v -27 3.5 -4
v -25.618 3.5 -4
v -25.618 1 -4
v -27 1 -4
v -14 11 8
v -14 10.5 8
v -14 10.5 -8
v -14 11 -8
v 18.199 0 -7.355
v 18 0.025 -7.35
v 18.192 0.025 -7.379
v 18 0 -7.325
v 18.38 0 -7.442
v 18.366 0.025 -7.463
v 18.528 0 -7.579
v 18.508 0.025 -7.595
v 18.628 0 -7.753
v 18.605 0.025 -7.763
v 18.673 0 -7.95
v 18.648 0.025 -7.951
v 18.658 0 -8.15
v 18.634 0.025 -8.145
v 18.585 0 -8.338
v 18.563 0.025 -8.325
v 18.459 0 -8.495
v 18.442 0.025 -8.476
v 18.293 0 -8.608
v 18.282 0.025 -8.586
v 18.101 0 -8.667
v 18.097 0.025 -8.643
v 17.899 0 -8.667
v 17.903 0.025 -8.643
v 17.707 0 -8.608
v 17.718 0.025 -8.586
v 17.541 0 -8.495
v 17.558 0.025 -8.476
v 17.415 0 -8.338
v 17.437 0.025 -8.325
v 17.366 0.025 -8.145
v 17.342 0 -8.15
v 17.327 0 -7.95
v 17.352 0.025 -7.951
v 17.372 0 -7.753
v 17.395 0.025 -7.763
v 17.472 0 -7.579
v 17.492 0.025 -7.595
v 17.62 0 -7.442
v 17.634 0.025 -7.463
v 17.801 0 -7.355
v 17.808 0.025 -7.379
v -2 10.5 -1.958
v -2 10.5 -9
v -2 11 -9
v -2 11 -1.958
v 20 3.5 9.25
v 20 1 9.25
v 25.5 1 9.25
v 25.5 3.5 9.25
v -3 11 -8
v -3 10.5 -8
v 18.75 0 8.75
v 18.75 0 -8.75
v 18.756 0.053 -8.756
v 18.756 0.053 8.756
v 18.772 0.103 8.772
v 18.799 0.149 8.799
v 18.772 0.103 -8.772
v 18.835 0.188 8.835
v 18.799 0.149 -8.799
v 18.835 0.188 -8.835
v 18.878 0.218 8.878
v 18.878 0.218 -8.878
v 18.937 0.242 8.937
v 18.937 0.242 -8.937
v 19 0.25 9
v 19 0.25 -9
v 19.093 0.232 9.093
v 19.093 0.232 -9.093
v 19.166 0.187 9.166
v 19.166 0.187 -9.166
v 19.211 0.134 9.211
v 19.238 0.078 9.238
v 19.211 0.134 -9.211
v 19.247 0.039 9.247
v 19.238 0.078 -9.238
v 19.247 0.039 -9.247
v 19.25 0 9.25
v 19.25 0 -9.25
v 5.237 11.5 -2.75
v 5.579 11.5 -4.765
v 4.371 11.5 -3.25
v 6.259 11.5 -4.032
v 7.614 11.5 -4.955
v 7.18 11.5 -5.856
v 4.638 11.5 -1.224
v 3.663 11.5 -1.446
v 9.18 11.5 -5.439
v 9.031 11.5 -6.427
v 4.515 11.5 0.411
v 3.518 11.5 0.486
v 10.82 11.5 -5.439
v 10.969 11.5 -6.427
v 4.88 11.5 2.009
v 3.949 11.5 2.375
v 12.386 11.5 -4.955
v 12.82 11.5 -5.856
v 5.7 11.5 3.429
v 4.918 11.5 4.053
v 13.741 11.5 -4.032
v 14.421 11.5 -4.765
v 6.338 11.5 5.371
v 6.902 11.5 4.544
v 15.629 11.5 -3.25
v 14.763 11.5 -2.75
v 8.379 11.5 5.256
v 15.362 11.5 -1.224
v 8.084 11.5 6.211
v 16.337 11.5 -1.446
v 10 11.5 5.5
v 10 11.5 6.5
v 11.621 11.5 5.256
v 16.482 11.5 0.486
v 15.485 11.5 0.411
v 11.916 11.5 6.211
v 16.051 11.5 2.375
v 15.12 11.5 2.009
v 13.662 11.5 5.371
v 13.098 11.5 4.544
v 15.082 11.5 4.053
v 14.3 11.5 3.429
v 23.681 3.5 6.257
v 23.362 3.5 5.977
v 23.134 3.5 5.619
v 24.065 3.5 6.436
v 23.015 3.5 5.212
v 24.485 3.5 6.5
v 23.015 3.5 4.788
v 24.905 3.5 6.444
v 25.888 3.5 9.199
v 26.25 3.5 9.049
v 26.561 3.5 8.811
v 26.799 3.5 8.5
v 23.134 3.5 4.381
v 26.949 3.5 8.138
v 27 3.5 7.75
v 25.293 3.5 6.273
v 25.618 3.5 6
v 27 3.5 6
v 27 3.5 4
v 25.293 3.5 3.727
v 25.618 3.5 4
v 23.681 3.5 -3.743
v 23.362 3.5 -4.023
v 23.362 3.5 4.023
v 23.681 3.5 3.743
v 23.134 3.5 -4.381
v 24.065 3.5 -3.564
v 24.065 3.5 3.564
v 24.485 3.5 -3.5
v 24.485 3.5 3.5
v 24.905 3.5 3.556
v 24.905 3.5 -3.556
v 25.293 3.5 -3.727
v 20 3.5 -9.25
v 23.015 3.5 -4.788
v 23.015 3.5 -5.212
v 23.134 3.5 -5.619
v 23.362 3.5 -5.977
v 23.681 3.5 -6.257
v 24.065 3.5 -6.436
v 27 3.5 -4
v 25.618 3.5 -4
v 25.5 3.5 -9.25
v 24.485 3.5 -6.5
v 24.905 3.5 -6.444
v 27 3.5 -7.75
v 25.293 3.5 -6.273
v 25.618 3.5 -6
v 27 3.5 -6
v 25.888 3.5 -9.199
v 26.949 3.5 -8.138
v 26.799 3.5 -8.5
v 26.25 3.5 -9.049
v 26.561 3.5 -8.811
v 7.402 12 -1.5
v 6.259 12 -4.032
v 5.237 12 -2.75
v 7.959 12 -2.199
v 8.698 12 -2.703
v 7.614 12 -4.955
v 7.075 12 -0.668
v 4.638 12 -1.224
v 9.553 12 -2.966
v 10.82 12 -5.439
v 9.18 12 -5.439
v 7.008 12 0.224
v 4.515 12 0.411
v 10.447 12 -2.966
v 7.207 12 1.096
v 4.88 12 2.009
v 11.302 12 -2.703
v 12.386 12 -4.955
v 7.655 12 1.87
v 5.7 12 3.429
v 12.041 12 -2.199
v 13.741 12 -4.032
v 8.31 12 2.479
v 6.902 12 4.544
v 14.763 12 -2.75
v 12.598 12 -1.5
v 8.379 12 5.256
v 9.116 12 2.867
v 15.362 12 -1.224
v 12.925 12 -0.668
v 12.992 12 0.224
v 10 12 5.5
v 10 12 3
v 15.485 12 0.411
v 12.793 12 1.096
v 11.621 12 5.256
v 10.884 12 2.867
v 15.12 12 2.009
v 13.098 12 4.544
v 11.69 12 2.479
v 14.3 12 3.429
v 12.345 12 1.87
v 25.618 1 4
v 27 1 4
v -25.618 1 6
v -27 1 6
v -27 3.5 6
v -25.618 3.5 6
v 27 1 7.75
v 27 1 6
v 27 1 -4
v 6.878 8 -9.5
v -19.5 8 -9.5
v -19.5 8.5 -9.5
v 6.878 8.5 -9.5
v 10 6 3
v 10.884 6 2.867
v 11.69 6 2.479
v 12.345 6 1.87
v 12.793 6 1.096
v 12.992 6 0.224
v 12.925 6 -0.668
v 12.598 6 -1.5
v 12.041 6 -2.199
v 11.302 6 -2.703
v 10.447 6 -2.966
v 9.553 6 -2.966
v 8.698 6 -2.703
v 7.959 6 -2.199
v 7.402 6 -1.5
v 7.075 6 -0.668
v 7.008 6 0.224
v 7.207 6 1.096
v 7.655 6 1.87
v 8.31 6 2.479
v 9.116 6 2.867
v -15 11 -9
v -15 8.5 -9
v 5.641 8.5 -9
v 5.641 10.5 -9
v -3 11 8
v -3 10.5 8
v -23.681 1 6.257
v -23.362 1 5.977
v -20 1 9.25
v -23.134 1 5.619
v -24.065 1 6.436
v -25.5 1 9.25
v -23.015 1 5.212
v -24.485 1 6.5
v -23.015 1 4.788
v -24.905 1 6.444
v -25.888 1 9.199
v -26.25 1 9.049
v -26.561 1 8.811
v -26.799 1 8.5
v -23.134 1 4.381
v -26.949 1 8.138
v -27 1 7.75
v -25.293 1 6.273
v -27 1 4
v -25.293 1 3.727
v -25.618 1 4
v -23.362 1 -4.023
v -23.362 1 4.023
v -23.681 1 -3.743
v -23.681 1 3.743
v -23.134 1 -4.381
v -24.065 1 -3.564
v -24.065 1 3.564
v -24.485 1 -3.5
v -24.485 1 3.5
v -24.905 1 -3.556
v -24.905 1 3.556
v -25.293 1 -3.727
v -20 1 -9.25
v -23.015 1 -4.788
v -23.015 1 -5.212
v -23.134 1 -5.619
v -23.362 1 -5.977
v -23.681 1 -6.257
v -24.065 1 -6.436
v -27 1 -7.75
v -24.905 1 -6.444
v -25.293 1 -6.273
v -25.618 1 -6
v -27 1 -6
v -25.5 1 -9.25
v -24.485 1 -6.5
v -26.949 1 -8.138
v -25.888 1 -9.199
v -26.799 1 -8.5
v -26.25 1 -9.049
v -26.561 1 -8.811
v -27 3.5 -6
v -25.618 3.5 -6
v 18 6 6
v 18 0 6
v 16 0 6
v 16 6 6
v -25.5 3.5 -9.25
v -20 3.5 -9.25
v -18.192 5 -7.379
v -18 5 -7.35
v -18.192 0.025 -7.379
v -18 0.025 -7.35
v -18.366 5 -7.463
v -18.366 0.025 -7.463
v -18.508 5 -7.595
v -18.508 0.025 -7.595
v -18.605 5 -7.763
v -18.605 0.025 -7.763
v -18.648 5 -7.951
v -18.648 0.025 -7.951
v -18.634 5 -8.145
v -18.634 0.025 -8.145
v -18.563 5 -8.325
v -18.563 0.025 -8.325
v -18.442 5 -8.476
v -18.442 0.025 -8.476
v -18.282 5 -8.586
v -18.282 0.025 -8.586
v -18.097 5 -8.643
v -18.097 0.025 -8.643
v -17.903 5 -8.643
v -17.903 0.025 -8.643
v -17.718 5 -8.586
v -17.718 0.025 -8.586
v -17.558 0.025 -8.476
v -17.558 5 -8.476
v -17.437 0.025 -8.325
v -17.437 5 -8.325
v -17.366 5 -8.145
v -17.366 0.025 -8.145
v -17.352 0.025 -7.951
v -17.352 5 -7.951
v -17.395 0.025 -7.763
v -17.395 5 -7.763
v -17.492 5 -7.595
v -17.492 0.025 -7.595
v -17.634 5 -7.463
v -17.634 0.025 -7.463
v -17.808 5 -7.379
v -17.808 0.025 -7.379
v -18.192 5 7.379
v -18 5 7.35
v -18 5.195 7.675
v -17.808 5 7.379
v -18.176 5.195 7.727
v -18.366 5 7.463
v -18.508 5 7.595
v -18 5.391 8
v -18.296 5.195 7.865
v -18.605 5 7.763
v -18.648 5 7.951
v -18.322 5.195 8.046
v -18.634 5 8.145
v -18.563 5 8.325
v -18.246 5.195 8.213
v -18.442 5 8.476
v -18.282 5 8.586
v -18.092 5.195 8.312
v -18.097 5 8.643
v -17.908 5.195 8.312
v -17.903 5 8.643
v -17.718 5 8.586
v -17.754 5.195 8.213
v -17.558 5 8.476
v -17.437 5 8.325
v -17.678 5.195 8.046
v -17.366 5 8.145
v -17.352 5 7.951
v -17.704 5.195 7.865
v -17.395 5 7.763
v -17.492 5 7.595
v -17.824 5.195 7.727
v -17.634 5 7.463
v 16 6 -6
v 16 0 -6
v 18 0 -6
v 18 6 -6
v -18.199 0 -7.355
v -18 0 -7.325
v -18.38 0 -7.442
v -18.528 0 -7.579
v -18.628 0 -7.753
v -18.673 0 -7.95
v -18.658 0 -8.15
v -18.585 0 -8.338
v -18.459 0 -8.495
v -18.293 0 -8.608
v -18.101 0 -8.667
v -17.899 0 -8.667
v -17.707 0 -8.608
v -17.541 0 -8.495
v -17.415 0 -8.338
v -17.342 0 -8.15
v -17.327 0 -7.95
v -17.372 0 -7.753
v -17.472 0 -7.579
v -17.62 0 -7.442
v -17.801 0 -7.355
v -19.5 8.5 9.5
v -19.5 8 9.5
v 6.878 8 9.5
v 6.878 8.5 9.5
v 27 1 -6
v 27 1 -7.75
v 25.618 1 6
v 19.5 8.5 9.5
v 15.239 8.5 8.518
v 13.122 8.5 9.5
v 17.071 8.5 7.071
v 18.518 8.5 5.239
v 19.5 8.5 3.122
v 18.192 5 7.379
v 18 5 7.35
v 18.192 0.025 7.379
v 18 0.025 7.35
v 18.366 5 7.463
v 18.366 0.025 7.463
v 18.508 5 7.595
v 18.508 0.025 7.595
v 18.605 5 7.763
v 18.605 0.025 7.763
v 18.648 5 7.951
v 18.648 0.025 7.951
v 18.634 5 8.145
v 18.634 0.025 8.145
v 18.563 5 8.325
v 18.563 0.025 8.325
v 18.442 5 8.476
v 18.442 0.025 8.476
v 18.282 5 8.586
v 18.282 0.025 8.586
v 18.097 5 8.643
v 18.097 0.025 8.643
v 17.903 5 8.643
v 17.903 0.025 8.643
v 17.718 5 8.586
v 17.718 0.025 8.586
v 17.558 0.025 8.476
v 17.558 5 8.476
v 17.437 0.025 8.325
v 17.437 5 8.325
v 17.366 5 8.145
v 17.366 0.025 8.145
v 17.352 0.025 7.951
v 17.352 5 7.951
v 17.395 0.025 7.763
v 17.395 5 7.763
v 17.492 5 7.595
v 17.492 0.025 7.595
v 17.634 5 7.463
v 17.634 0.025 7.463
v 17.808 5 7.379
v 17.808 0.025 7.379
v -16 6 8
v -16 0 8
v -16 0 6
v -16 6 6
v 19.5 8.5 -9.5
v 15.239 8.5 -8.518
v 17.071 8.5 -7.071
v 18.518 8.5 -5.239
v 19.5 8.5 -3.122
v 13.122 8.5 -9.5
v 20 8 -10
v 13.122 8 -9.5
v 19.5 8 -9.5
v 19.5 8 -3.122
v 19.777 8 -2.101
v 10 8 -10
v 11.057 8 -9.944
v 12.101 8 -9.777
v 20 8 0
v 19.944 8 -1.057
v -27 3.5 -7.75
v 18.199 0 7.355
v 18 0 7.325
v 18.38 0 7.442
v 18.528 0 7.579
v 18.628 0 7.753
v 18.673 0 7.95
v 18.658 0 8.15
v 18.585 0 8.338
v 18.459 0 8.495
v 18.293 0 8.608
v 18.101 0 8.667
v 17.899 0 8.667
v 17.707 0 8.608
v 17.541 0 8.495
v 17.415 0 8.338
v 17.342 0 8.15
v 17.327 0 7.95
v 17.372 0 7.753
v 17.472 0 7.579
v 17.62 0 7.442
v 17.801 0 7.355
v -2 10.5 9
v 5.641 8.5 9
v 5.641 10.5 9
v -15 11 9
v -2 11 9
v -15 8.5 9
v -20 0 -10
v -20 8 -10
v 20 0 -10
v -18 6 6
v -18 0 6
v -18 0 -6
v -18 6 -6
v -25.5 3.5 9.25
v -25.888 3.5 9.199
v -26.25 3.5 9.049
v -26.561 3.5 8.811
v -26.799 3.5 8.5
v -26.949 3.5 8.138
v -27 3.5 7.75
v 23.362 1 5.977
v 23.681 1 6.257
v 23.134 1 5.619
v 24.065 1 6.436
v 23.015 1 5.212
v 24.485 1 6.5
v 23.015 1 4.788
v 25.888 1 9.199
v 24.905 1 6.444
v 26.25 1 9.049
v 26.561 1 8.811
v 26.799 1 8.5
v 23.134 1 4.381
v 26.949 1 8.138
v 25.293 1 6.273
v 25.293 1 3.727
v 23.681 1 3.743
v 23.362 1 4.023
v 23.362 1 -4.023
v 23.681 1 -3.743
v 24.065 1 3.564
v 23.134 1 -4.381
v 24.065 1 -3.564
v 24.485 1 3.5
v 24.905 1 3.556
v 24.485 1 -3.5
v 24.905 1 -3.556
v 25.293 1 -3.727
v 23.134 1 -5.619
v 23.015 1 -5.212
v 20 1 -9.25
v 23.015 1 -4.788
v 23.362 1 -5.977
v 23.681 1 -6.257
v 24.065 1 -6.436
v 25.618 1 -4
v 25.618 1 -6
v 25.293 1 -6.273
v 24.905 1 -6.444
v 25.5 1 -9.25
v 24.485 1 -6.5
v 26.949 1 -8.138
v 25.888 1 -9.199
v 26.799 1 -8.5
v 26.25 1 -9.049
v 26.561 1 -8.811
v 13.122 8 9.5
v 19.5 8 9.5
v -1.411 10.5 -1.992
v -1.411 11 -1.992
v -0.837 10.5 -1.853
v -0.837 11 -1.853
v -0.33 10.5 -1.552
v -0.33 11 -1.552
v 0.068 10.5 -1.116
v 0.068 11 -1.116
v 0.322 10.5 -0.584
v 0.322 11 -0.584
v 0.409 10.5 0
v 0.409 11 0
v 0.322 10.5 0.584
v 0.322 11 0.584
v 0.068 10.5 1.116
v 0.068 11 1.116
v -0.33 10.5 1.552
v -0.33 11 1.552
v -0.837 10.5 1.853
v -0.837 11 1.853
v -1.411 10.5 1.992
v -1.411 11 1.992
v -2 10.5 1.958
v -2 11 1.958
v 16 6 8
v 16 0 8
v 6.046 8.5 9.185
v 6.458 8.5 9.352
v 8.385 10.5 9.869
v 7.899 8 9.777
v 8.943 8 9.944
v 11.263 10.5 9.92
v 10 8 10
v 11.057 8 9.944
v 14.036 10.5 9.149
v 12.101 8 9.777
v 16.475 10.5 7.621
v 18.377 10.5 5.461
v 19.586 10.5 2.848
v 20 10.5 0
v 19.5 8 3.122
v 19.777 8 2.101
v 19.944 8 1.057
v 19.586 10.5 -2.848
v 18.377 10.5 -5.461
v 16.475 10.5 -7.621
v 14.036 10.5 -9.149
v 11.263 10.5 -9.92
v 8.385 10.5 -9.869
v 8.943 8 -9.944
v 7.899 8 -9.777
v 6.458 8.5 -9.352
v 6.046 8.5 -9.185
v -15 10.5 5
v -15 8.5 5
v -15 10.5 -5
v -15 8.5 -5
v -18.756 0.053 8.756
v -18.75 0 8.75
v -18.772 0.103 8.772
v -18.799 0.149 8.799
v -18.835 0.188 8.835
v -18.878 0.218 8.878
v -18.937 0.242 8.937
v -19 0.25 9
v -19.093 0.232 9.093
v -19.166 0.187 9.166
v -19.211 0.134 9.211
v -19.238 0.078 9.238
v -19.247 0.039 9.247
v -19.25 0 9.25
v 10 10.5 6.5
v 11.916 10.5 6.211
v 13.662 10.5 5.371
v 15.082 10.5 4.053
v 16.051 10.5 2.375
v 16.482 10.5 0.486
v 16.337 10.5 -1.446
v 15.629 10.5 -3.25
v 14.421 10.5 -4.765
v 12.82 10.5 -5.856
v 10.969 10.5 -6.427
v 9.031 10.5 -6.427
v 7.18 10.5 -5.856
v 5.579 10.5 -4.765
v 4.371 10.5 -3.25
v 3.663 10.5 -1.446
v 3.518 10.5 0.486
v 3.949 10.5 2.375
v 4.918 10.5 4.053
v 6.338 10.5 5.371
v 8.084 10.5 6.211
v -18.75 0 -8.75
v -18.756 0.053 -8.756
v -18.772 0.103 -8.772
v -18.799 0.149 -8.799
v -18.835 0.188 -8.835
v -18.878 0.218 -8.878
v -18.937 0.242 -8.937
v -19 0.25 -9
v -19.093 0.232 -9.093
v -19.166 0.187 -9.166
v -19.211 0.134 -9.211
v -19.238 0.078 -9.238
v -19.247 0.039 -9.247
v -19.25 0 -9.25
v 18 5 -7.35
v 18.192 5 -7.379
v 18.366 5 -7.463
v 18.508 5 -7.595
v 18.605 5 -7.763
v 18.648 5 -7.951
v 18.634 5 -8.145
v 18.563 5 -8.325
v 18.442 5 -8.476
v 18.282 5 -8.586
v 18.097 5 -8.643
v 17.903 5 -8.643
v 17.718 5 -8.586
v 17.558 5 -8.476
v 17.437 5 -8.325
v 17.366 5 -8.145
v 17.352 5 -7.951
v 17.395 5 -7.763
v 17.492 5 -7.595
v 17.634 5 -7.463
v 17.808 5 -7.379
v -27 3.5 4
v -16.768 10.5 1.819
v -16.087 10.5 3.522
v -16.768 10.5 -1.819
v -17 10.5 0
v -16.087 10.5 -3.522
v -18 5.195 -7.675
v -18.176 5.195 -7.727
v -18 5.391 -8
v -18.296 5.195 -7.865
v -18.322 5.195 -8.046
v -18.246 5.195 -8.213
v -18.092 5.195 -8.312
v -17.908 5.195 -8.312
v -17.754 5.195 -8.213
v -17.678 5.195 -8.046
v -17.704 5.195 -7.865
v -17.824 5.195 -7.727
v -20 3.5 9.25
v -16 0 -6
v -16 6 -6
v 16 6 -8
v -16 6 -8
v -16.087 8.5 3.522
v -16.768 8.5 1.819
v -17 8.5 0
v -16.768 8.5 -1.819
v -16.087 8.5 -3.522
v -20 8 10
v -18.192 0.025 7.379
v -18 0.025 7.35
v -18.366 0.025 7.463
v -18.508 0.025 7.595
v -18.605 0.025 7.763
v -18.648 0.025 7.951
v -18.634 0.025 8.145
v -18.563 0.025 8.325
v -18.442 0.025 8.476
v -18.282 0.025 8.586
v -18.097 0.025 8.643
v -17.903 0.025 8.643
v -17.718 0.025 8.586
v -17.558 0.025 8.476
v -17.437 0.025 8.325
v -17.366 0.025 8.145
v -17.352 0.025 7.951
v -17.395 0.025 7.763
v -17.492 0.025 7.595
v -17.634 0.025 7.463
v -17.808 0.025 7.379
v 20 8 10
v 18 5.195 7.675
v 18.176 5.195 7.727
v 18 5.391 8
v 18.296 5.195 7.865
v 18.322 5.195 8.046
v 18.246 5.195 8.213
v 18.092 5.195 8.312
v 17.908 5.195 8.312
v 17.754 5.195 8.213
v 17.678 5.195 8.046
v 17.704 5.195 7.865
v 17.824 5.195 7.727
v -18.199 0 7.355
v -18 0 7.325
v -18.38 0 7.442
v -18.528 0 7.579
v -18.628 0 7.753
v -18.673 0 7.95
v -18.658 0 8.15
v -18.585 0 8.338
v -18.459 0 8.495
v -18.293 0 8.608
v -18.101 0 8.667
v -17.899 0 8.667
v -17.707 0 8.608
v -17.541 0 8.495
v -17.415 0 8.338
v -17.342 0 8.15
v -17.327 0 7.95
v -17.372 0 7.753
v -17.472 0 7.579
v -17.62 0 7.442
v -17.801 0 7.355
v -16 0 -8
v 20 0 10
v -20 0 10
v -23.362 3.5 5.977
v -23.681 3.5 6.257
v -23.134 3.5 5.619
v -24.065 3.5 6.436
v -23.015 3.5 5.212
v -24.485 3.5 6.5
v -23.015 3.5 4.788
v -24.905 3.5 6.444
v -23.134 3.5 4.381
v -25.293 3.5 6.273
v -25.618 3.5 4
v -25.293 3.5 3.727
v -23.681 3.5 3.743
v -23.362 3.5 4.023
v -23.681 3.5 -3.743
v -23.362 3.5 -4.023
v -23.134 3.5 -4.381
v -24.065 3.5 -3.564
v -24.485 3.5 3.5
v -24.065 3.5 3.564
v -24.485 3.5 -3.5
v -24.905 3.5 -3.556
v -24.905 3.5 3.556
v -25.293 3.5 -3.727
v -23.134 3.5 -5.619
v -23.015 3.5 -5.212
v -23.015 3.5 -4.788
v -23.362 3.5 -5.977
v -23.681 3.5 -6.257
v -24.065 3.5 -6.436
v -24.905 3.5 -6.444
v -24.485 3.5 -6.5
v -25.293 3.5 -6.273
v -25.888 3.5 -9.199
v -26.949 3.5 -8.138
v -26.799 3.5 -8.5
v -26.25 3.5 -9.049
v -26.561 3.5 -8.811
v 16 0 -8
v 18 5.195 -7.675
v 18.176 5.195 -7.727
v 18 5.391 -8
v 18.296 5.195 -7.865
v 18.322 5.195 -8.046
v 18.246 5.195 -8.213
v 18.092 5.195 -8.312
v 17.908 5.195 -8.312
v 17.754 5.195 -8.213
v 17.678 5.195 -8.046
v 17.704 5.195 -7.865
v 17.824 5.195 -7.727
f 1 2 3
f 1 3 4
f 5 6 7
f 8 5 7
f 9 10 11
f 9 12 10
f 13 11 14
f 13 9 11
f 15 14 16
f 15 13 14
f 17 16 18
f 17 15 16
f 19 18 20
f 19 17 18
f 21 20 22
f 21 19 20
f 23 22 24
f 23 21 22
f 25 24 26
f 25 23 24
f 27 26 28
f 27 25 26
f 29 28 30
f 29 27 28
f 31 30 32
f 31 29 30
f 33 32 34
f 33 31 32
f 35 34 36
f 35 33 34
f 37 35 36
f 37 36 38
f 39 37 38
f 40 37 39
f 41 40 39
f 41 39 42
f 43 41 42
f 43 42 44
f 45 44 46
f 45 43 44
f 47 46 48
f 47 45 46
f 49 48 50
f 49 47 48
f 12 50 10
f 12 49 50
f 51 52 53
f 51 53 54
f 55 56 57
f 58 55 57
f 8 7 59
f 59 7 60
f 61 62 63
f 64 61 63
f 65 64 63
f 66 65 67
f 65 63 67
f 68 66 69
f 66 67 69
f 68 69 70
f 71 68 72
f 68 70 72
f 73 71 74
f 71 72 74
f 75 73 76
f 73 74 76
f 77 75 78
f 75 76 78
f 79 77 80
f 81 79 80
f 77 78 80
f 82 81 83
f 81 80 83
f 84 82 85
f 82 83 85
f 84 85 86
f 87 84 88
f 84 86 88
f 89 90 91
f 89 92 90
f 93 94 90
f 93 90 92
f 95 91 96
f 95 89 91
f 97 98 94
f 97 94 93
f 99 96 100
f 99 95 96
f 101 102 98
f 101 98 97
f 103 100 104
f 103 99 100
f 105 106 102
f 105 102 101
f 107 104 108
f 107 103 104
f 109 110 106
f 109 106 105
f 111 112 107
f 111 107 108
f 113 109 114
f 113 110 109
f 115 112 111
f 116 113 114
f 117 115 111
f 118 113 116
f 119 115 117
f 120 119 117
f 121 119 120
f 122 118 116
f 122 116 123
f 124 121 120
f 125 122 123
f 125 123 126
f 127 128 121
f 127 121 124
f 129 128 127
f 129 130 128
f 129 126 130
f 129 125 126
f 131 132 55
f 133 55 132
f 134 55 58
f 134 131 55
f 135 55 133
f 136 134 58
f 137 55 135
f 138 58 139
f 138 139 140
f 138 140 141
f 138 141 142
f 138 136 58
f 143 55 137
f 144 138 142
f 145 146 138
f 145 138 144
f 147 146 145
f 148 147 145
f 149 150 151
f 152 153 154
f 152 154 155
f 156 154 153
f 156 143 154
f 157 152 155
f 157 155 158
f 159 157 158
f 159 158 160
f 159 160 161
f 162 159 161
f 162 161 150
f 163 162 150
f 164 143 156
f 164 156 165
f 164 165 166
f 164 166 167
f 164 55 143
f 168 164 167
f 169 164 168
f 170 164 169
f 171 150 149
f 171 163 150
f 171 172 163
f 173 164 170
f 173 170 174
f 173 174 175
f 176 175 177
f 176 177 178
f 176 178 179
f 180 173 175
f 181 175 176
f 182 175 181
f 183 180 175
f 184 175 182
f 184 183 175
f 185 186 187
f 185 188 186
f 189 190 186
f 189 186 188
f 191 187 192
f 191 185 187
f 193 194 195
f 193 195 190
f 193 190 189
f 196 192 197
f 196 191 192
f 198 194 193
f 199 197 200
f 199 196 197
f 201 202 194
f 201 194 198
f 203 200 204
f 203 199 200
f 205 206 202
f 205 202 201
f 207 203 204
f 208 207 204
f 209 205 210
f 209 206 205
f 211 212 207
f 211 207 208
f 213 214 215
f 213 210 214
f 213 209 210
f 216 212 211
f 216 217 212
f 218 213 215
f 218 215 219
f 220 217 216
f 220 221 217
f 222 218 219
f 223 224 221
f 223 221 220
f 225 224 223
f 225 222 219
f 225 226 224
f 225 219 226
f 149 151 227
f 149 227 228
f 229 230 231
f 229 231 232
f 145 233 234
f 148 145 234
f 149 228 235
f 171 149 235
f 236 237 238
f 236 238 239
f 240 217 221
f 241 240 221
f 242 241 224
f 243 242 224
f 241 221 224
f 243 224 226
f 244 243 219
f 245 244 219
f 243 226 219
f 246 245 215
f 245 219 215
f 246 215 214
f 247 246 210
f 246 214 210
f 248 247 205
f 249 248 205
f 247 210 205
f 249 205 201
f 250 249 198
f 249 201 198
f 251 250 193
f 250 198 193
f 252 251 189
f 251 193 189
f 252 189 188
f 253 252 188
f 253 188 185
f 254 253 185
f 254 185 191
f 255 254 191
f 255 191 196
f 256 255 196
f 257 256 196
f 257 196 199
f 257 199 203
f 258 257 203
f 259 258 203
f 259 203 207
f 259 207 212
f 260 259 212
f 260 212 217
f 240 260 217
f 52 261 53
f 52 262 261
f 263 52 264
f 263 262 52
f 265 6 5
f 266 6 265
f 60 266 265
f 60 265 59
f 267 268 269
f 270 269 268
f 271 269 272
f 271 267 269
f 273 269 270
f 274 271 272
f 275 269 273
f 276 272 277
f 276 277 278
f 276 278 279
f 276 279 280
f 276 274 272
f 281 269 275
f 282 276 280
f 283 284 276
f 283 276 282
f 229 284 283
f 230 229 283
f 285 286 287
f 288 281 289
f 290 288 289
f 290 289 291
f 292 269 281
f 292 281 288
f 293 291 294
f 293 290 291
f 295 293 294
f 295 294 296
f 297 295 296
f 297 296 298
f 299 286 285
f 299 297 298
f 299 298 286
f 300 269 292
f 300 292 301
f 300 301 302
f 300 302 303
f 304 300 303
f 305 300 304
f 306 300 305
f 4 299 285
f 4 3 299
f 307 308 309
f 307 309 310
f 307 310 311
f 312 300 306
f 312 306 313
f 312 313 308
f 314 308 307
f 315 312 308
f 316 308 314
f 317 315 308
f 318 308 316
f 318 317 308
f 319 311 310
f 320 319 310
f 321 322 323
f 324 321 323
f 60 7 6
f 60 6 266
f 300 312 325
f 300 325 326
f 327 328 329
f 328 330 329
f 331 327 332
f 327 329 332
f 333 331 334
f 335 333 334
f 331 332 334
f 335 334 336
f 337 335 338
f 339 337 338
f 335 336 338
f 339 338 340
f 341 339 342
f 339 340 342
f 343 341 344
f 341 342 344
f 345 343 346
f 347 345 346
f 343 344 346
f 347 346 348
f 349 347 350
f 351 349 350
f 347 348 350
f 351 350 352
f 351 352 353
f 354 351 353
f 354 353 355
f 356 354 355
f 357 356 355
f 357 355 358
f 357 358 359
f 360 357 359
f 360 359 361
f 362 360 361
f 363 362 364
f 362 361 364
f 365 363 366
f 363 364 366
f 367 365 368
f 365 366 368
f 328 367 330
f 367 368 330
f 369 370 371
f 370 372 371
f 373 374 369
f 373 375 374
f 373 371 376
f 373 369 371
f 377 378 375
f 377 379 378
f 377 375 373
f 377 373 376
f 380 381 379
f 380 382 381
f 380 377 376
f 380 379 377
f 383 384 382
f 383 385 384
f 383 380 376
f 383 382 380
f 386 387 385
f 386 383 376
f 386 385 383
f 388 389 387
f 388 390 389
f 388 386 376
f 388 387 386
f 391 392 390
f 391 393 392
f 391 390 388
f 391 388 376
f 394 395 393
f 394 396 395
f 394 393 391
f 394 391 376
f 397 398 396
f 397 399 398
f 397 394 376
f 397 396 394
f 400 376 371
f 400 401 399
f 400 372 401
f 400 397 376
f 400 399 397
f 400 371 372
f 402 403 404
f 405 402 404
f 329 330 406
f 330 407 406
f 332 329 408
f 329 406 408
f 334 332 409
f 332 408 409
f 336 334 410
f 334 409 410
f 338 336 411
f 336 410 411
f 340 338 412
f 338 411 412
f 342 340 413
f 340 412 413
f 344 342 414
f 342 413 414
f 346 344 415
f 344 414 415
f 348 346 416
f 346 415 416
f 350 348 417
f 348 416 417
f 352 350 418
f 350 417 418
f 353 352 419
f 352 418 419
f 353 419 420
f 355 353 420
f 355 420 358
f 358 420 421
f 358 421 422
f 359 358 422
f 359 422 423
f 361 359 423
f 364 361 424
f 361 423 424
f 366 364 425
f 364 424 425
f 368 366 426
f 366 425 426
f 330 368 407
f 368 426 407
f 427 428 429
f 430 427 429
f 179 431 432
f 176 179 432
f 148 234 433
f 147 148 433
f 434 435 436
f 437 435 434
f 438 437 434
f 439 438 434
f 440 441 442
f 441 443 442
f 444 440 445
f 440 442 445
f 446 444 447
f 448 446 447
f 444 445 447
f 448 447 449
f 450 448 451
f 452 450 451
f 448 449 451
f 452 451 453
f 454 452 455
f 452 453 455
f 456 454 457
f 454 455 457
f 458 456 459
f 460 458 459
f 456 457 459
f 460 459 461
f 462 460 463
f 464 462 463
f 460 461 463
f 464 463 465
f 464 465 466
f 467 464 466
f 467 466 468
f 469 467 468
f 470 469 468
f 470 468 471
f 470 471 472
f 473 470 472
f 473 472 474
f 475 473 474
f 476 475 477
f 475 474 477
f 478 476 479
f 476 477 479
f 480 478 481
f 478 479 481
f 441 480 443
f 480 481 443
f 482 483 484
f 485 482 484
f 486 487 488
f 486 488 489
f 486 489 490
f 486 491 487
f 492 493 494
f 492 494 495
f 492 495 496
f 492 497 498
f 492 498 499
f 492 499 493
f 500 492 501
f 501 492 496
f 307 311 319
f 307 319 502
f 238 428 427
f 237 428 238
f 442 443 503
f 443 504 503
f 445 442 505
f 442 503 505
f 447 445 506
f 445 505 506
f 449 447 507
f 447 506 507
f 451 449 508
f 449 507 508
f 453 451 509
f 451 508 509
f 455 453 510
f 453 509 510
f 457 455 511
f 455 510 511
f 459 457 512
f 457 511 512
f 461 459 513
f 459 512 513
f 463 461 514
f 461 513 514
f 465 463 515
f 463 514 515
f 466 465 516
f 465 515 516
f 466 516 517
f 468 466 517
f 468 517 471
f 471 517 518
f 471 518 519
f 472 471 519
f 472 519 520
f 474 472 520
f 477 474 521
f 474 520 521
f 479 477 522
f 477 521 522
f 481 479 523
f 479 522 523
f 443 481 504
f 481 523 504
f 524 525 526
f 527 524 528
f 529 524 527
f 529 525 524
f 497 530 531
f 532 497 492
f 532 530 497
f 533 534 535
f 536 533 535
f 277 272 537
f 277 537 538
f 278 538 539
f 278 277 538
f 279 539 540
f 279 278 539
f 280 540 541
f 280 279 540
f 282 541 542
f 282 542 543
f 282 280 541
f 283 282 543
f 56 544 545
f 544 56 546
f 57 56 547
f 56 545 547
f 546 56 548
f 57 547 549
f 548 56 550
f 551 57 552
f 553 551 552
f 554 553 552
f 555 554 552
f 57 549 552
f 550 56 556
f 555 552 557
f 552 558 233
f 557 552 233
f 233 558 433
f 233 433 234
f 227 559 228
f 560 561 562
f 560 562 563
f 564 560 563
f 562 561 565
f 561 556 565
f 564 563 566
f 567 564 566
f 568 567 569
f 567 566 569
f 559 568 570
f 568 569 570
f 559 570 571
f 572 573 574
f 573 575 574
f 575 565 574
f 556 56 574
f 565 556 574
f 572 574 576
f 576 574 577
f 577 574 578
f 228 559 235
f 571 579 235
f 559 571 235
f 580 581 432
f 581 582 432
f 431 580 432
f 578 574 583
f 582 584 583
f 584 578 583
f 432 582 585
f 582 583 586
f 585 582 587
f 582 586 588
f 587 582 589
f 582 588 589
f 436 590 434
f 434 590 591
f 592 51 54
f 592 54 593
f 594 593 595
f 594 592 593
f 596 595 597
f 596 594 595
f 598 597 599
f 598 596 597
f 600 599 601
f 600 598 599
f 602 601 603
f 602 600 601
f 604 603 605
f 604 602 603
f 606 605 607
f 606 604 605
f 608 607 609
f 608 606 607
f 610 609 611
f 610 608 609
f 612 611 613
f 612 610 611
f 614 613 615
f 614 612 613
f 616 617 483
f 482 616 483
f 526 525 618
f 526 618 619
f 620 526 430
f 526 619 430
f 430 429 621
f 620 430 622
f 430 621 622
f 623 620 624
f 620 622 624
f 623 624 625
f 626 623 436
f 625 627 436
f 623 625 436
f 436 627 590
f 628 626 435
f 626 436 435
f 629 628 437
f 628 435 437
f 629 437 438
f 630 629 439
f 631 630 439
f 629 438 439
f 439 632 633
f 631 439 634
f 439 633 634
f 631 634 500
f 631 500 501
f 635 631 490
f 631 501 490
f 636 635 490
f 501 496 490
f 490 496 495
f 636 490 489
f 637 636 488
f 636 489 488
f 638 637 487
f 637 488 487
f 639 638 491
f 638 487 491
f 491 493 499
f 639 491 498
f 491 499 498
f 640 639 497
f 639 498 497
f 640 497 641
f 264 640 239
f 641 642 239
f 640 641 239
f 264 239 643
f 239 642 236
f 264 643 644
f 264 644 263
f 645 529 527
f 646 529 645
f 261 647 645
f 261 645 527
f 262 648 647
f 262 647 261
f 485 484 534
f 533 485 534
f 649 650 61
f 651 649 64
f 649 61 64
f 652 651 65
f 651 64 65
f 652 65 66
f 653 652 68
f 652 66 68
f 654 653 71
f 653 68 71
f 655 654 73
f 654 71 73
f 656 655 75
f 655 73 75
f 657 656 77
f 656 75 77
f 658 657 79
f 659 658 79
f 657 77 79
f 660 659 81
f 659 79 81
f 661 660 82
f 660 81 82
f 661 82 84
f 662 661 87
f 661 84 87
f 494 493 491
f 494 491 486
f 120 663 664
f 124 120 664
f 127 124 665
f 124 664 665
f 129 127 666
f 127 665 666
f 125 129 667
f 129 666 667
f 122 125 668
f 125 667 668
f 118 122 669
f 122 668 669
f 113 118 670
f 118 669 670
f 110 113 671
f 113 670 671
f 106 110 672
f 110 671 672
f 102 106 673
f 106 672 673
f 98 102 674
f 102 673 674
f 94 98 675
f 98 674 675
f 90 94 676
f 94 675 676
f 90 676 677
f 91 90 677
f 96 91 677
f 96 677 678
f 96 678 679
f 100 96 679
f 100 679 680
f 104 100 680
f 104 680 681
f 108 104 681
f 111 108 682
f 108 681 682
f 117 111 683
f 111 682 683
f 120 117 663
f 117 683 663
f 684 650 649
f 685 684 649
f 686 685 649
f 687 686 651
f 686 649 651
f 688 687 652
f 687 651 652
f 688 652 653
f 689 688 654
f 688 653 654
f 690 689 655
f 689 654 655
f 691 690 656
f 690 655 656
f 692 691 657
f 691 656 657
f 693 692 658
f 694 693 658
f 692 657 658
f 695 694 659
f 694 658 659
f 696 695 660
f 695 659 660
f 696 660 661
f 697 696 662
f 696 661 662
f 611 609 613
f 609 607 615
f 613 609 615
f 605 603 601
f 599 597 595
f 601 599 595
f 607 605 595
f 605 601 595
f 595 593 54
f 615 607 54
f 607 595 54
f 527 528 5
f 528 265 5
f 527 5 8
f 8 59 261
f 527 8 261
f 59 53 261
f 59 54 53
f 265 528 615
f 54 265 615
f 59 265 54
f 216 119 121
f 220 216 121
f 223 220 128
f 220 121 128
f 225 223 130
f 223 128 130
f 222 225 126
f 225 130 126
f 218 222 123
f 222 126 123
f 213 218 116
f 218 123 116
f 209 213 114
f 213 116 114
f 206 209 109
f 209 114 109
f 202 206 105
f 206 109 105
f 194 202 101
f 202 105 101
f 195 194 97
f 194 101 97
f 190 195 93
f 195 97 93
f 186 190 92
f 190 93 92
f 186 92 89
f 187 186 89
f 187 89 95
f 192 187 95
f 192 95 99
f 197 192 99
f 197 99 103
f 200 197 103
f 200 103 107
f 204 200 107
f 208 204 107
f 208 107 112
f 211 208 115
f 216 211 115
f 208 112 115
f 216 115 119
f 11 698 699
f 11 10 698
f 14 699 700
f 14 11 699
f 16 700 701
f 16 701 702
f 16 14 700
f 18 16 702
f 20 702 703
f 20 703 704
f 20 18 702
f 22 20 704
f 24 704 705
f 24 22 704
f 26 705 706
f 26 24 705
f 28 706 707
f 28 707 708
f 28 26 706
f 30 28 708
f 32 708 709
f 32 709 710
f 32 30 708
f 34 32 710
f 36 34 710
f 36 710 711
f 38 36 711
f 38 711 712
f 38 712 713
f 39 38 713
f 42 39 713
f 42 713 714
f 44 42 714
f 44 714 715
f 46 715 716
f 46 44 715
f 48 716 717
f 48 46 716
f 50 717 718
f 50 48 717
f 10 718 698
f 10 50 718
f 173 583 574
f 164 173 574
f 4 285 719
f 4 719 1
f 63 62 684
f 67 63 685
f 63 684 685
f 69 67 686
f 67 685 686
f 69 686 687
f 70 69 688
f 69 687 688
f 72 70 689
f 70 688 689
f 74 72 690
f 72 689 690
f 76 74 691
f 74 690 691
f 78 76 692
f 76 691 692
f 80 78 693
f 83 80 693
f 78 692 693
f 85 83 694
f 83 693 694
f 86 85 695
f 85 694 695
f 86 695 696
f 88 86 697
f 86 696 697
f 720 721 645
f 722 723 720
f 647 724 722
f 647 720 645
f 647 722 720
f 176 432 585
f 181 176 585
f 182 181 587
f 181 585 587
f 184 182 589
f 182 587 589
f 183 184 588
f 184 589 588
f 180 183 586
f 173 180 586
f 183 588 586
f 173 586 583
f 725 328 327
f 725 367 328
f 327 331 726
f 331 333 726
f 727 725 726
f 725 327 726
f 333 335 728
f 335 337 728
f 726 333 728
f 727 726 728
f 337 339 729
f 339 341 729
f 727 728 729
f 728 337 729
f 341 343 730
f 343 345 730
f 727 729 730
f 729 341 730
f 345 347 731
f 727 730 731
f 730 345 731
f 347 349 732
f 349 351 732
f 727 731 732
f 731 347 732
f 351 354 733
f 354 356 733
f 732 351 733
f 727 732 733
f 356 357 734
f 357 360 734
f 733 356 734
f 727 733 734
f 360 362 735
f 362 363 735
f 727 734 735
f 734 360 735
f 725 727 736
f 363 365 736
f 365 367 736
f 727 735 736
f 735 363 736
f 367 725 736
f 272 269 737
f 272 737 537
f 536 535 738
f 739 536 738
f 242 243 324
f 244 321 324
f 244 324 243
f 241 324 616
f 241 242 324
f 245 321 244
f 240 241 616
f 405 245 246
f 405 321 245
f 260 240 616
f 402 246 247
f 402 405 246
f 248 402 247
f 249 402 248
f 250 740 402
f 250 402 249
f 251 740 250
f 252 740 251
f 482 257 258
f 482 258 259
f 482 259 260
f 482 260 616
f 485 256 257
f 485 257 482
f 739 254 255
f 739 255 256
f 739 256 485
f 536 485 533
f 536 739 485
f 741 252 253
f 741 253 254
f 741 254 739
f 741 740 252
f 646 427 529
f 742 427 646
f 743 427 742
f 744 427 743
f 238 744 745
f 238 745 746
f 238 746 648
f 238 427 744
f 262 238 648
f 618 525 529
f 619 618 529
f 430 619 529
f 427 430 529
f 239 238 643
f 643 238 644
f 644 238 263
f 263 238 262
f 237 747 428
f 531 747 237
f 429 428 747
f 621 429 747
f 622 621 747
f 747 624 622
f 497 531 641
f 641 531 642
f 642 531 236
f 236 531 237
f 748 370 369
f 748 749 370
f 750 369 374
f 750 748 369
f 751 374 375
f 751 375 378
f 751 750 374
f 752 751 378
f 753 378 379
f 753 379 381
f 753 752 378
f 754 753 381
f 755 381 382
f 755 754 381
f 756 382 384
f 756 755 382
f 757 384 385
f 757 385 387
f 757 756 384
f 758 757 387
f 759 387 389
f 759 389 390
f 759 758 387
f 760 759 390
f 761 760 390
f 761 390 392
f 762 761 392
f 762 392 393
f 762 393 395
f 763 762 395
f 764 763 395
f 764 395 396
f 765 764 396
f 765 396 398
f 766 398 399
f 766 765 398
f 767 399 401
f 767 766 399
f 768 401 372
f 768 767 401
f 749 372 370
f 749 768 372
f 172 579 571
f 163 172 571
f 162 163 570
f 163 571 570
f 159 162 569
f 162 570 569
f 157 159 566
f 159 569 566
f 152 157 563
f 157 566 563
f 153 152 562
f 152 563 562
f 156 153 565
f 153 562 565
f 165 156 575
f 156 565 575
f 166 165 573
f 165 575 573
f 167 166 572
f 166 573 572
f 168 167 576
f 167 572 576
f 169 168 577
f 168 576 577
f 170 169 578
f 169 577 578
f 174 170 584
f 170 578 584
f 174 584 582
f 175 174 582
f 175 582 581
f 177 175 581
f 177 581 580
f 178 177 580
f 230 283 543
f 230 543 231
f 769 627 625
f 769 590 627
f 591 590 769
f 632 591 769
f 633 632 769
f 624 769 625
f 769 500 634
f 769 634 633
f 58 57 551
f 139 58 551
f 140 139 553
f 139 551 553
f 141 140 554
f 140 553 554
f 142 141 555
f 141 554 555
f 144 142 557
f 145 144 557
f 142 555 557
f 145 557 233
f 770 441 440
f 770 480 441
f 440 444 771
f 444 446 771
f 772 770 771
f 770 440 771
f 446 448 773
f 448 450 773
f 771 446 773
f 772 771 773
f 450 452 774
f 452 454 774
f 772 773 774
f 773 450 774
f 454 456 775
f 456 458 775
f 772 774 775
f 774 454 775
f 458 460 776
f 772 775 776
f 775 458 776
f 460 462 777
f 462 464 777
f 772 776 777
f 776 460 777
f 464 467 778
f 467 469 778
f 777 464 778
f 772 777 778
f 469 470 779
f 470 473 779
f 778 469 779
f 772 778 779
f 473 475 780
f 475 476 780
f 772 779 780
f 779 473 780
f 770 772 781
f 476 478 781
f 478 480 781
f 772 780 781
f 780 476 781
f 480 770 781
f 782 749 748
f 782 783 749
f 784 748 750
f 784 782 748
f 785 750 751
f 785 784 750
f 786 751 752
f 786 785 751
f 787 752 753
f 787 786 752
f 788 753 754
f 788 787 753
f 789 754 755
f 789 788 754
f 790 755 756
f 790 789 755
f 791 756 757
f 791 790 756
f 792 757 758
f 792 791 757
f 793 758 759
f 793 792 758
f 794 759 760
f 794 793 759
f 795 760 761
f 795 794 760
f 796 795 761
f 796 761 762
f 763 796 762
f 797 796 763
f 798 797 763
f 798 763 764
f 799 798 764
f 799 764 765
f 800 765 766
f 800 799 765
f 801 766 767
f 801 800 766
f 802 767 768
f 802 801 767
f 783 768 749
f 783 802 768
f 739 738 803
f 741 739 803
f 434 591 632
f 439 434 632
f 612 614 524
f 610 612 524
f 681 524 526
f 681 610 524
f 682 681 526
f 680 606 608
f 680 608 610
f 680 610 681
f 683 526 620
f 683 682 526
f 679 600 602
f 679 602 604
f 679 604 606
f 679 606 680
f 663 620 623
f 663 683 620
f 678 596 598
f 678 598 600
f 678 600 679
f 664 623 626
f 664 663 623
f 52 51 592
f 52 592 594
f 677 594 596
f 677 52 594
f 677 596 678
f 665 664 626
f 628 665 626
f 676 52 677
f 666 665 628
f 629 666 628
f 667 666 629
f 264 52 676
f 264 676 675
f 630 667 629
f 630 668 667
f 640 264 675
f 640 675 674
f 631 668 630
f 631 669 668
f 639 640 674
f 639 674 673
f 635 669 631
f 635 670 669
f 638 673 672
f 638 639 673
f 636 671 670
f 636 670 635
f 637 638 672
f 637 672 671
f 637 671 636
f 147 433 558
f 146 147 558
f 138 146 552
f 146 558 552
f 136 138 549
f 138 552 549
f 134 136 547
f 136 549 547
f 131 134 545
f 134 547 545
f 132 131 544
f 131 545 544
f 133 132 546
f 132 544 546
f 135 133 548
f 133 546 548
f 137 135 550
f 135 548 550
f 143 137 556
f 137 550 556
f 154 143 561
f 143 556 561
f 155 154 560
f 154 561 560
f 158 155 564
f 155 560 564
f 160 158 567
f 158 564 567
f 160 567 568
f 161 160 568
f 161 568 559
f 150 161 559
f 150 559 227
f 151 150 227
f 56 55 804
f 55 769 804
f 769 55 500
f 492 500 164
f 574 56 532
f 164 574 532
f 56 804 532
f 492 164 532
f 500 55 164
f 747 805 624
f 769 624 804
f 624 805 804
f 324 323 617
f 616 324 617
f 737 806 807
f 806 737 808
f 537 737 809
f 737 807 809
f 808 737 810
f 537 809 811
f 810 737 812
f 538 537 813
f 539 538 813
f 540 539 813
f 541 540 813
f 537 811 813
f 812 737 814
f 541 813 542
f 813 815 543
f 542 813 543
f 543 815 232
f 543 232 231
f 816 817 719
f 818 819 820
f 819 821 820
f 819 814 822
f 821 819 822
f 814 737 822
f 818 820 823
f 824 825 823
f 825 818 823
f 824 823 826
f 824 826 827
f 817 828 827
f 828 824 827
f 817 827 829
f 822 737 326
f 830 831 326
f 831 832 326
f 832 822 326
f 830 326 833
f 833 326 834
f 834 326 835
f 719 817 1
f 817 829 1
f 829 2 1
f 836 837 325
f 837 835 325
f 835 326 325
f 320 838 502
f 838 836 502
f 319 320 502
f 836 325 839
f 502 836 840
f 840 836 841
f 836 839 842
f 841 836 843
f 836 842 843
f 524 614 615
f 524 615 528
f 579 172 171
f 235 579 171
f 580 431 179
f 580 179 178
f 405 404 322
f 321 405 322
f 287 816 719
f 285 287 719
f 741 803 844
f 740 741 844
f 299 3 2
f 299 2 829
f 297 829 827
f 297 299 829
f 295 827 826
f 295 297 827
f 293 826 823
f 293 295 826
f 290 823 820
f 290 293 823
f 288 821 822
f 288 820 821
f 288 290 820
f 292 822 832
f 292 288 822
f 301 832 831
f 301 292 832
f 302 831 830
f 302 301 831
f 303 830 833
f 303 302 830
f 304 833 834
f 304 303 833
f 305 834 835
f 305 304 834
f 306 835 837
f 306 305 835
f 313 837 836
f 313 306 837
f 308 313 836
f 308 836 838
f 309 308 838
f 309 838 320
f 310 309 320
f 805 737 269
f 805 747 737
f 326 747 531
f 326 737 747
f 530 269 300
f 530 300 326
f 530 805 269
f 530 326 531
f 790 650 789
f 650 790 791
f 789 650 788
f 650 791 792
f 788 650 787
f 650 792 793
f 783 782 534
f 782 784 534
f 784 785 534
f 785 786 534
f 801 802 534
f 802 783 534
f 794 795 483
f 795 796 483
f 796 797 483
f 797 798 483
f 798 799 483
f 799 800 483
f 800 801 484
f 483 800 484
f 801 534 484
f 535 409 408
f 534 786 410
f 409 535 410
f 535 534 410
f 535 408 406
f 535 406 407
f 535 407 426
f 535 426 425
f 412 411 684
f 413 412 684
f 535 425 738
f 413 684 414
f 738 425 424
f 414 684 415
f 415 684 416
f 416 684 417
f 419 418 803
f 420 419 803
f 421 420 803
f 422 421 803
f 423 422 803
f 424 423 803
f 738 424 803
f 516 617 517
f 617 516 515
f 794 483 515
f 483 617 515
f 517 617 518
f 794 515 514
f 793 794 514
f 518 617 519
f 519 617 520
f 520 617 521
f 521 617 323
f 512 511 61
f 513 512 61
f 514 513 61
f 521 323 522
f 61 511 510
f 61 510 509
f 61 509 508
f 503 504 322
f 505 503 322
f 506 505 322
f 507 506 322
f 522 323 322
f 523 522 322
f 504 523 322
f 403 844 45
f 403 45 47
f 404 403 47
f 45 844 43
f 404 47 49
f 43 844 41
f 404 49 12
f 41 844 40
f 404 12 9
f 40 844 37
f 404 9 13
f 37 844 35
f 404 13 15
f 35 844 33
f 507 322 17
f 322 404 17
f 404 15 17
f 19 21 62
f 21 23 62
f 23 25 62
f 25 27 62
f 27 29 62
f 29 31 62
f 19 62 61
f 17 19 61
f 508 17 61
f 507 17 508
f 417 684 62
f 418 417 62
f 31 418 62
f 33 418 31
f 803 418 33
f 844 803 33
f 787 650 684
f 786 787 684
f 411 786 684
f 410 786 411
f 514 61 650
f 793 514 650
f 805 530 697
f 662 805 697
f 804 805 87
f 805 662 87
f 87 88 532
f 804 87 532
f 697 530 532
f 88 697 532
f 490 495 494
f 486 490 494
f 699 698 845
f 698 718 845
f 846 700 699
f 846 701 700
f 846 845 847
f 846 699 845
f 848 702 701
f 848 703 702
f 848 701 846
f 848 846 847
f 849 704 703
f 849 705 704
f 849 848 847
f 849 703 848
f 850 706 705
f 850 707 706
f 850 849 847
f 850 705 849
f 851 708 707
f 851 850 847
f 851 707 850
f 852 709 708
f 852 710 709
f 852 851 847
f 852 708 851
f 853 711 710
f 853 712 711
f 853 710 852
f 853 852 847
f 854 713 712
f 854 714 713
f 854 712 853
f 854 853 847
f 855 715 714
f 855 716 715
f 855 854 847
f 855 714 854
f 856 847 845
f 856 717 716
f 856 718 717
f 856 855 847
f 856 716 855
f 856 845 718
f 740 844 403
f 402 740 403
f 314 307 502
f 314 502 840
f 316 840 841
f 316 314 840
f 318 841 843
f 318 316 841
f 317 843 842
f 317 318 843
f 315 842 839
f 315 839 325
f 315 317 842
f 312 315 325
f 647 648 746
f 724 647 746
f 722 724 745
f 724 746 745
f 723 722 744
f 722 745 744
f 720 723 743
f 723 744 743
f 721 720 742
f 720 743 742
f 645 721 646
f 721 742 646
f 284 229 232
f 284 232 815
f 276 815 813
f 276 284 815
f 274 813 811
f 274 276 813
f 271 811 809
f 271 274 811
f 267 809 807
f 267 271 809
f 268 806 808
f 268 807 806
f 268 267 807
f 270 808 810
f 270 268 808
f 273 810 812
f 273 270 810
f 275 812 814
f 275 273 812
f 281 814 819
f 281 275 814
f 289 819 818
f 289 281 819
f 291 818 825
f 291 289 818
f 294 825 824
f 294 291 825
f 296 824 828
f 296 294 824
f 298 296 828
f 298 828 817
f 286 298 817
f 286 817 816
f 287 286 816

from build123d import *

# Parameters (mm, degrees)
SCHIZZO2_W                   = 40
SCHIZZO2_H                   = 20
ESTRUSIONE_ESTRUSIONE2_DEPTH = 8
TAGLIO_ESTRUSIONE4_DEPTH     = 6
ESTRUSIONE_ESTRUSIONE4_DEPTH = 2.5
SCHIZZO8_W                   = 39
SCHIZZO8_H                   = 19
ESTRUSIONE_ESTRUSIONE3_DEPTH = 0.5
SCHIZZO10_W                  = 11
SCHIZZO10_H                  = 16
ESTRUSIONE_ESTRUSIONE5_DEPTH = 0.5
SCHIZZO11_R                  = 6.5
ESTRUSIONE_ESTRUSIONE6_DEPTH = 1
SCHIZZO12_R                  = 5.5
ESTRUSIONE_ESTRUSIONE7_DEPTH = 0.5
SCHIZZO13_R                  = 3
TAGLIO_ESTRUSIONE5_DEPTH     = 26.377155081
SCHIZZO15_R                  = 1.5
ESTRUSIONE_ESTRUSIONE8_DEPTH = 2.5
SCHIZZO17_W                  = 7.322091749
SCHIZZO17_H                  = 2
TAGLIO_ESTRUSIONE6_DEPTH     = 31.020826105
SPECCHIA4_COPY_1_SKETCH_W    = 7.322091749
SPECCHIA4_COPY_1_SKETCH_H    = 2
SPECCHIA4_COPY_1_DEPTH       = 31.020826105


with BuildPart() as part:
    # Schizzo2 → Estrusione-Estrusione2 (new body)
    with BuildSketch(Plane(origin=(0, 0, 0), x_dir=(1, 0, 0), z_dir=(0, 1, 0))):
        Rectangle(SCHIZZO2_W, SCHIZZO2_H)
    extrude(amount=ESTRUSIONE_ESTRUSIONE2_DEPTH)

    # Schizzo3 → Taglio-Estrusione4 (cut)
    with BuildSketch(Plane(origin=(0, 0, 0), x_dir=(1, 0, 0), z_dir=(0, 1, 0))):
        Polygon((16, -8), (-16, -8), (-16, -6), (-18, -6), (-18, 6), (-16, 6), (-16, 8), (16, 8), (16, 6), (18, 6), (18, -6), (16, -6), align=None)
    extrude(amount=TAGLIO_ESTRUSIONE4_DEPTH, mode=Mode.SUBTRACT)

    # Schizzo4 → Foro per Vite M1-1 (revolve, cut)
    with BuildSketch(Plane(origin=(-18, 0, 8), x_dir=(0, 0, -1), z_dir=(1, 0, 0))):
        Polygon((0, 0), (0, 5.390559402), (0.65, 5), (0.65, 0.025), (0.675, 0), align=None)
    foro_per_vite_m1_1 = revolve(axis=Axis((-18, -6.35, 8), (0, 1, 0)), mode=Mode.SUBTRACT)

    # Specchia1: Foro per Vite M1-1 across plane
    add(foro_per_vite_m1_1.mirror(Plane(origin=(0, 0, 0), x_dir=(0, 0, 1), z_dir=(1, 0, 0))), mode=Mode.SUBTRACT)

    # Specchia2: Foro per Vite M1-1 across plane
    add(foro_per_vite_m1_1.mirror(Plane.XY), mode=Mode.SUBTRACT)

    # Specchia2 copy 1 sketch → Specchia2 copy 1 (revolve, cut)
    with BuildSketch(Plane(origin=(18, 0, -8), x_dir=(0, 0, 1), z_dir=(-1, 0, 0))):
        Polygon((0, 0), (0, 5.390559402), (0.65, 5), (0.65, 0.025), (0.675, 0), align=None)
    revolve(axis=Axis((18, -6.35, -8), (0, 1, 0)), mode=Mode.SUBTRACT)

    # Taglia-Sweep3: sweep along a path in Schizzo5
    with BuildLine(Plane.XZ) as taglia_sweep3_path:
        Line((19, -9), (-19, -9))
        Line((-19, -9), (-19, 9))
        Line((-19, 9), (19, 9))
        Line((19, 9), (19, -9))
    # Schizzo7 → Taglia-Sweep3 (sweep, cut)
    with BuildSketch(Plane.XY):
        with BuildLine():
            Line((-19.25, 0), (-18.75, 0))
            ThreePointArc((-18.75, 0), (-19, 0.25), (-19.25, 0))
        make_face()
    sweep(path=taglia_sweep3_path.line, transition=Transition.RIGHT, mode=Mode.SUBTRACT)

    # Schizzo9 → Estrusione-Estrusione4 (add)
    with BuildSketch(Plane(origin=(0, 8, 0), x_dir=(1, 0, 0), z_dir=(0, 1, 0))):
        with BuildLine():
            Line((5.641101056, 9), (-15, 9))
            Line((-15, 9), (-15, 5))
            ThreePointArc((-15, 5), (-17, 0), (-15, -5))
            Line((-15, -5), (-15, -9))
            Line((-15, -9), (5.641101056, -9))
            ThreePointArc((5.641101056, -9), (20, 0), (5.641101056, 9))
        make_face()
    extrude(amount=ESTRUSIONE_ESTRUSIONE4_DEPTH)

    # Schizzo8 → Estrusione-Estrusione3 (add)
    with BuildSketch(Plane(origin=(0, 8, 0), x_dir=(1, 0, 0), z_dir=(0, 1, 0))):
        Rectangle(SCHIZZO8_W, SCHIZZO8_H)
    extrude(amount=ESTRUSIONE_ESTRUSIONE3_DEPTH)

    # Schizzo10 → Estrusione-Estrusione5 (add)
    with BuildSketch(Plane(origin=(0, 10.5, 0), x_dir=(1, 0, 0), z_dir=(0, 1, 0))):
        with BuildLine():
            Line((-15, 9), (-2, 9))
            Line((-2, 9), (-2, 1.957707578))
            ThreePointArc((-2, 1.957707578), (0.409122281, 0), (-2, -1.957707578))
            Line((-2, -1.957707578), (-2, -9))
            Line((-2, -9), (-15, -9))
            Line((-15, -9), (-15, 9))
        make_face()
        with Locations((-8.5, 0)):
            Rectangle(SCHIZZO10_W, SCHIZZO10_H, mode=Mode.SUBTRACT)
    extrude(amount=ESTRUSIONE_ESTRUSIONE5_DEPTH)

    # Schizzo11 → Estrusione-Estrusione6 (add)
    with BuildSketch(Plane(origin=(0, 10.5, 0), x_dir=(1, 0, 0), z_dir=(0, 1, 0))):
        with Locations(Location((10, 0, 0), (0, 0, 270))):
            Circle(SCHIZZO11_R)
    extrude(amount=ESTRUSIONE_ESTRUSIONE6_DEPTH)

    # Schizzo12 → Estrusione-Estrusione7 (add)
    with BuildSketch(Plane(origin=(0, 11.5, 0), x_dir=(1, 0, 0), z_dir=(0, 1, 0))):
        with Locations(Location((10, 0, 0), (0, 0, 270))):
            Circle(SCHIZZO12_R)
    extrude(amount=ESTRUSIONE_ESTRUSIONE7_DEPTH)

    # Schizzo13 → Taglio-Estrusione5 (cut, through all)
    with BuildSketch(Plane(origin=(0, 12, 0), x_dir=(1, 0, 0), z_dir=(0, 1, 0))):
        with Locations(Location((10, 0, 0), (0, 0, 270))):
            Circle(SCHIZZO13_R)
    extrude(amount=-TAGLIO_ESTRUSIONE5_DEPTH, mode=Mode.SUBTRACT)

    # Schizzo15 → Estrusione-Estrusione8 (add)
    with BuildSketch(Plane(origin=(0, 1, 0), x_dir=(-1, 0, 0), z_dir=(0, -1, 0))):
        with BuildLine():
            Line((-25.5, 9.25), (-20, 9.25))
            Line((-20, 9.25), (-20, -9.25))
            Line((-20, -9.25), (-25.5, -9.25))
            ThreePointArc((-25.5, -9.25), (-26.560660172, -8.810660172), (-27, -7.75))
            Line((-27, -7.75), (-27, 7.75))
            ThreePointArc((-27, 7.75), (-26.560660172, 8.810660172), (-25.5, 9.25))
        make_face()
        with Locations(Location((-24.5, 5, 0), (0, 0, 90))):
            Circle(SCHIZZO15_R, mode=Mode.SUBTRACT)
        with Locations(Location((-24.5, -5, 0), (0, 0, 90))):
            Circle(SCHIZZO15_R, mode=Mode.SUBTRACT)
    estrusione_estrusione8 = extrude(amount=-ESTRUSIONE_ESTRUSIONE8_DEPTH)

    # Schizzo17 → Taglio-Estrusione6 (cut, through all)
    with BuildSketch(Plane(origin=(0, 3.5, 0), x_dir=(1, 0, 0), z_dir=(0, 1, 0))):
        with Locations((30.661045875, 5)):
            Rectangle(SCHIZZO17_W, SCHIZZO17_H)
        with BuildLine():
            Line((25.618033989, 4), (27, 4))
            Line((27, 4), (27, 6))
            Line((27, 6), (25.618033989, 6))
            ThreePointArc((25.618033989, 6), (25.645827846, 5.968028175), (25.672707741, 5.93528421))
            ThreePointArc((25.672707741, 5.93528421), (25.915814538, 5.495448478), (26, 5))
            ThreePointArc((26, 5), (25.915814538, 4.504551522), (25.672707741, 4.06471579))
            ThreePointArc((25.672707741, 4.06471579), (25.645827846, 4.031971825), (25.618033989, 4))
        make_face()
    taglio_estrusione6 = extrude(amount=-TAGLIO_ESTRUSIONE6_DEPTH, mode=Mode.SUBTRACT)

    # Specchia3: Taglio-Estrusione6 across plane
    add(taglio_estrusione6.mirror(Plane.XY), mode=Mode.SUBTRACT)

    # Specchia4: Estrusione-Estrusione8, Taglio-Estrusione6 across plane
    add(estrusione_estrusione8.mirror(Plane(origin=(0, 0, 0), x_dir=(0, 0, 1), z_dir=(1, 0, 0))))
    add(taglio_estrusione6.mirror(Plane(origin=(0, 0, 0), x_dir=(0, 0, 1), z_dir=(1, 0, 0))), mode=Mode.SUBTRACT)

    # Specchia4 copy 1 sketch → Specchia4 copy 1 (cut, through all)
    with BuildSketch(Plane(origin=(0, 3.5, 0), x_dir=(-1, 0, 0), z_dir=(0, 1, 0))):
        with Locations((30.661045875, 5)):
            Rectangle(SPECCHIA4_COPY_1_SKETCH_W, SPECCHIA4_COPY_1_SKETCH_H)
        with BuildLine():
            Line((25.618033989, 4), (27, 4))
            Line((27, 4), (27, 6))
            Line((27, 6), (25.618033989, 6))
            ThreePointArc((25.618033989, 6), (25.645827846, 5.968028175), (25.672707741, 5.93528421))
            ThreePointArc((25.672707741, 5.93528421), (25.915814538, 5.495448478), (26, 5))
            ThreePointArc((26, 5), (25.915814538, 4.504551522), (25.672707741, 4.06471579))
            ThreePointArc((25.672707741, 4.06471579), (25.645827846, 4.031971825), (25.618033989, 4))
        make_face()
    extrude(amount=-SPECCHIA4_COPY_1_DEPTH, mode=Mode.SUBTRACT)


solid = part.part
